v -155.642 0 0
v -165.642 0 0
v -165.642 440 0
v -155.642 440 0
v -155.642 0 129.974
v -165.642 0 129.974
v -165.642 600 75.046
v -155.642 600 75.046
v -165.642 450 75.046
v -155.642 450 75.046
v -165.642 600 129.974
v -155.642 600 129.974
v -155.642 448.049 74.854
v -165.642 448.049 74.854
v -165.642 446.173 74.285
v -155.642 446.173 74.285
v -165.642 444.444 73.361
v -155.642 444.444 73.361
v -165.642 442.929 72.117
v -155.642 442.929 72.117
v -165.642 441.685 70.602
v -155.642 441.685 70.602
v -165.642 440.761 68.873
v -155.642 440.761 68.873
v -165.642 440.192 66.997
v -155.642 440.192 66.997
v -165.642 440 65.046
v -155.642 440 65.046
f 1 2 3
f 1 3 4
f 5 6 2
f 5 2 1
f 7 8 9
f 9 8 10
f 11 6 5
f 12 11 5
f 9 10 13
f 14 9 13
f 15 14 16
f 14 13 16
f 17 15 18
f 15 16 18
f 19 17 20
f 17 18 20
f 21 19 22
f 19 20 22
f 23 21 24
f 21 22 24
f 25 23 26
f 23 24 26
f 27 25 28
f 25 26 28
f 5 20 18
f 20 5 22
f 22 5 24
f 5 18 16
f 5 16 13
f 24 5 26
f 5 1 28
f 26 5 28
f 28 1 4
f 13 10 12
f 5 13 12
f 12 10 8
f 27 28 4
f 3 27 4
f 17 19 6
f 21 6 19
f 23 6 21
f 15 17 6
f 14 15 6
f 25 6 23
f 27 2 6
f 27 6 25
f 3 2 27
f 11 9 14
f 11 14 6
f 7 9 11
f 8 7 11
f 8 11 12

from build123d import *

# Parameters (mm, degrees)
ESQUISSE1_W             = 10
ESQUISSE1_H             = 600
BOSS_EXTRU_1_DEPTH      = 129.973967
ENL_V_MAT_EXTRU_1_DEPTH = 10


with BuildPart() as part:
    # Esquisse1 → Boss.-Extru.1 (new body)
    with BuildSketch(Plane.XY):
        with Locations((-160.641983179, 300)):
            Rectangle(ESQUISSE1_W, ESQUISSE1_H)
    extrude(amount=BOSS_EXTRU_1_DEPTH)

    # Esquisse2 → Enlèv. mat.-Extru.1 (cut)
    with BuildSketch(Plane(origin=(-155.641983179, 0, 0), x_dir=(0, 0, -1), z_dir=(1, 0, 0))):
        with BuildLine():
            Line((0, 600), (-75.04598428, 600))
            Line((-75.04598428, 600), (-75.04598428, 450))
            ThreePointArc((-75.04598428, 450), (-72.117052092, 442.928932188), (-65.04598428, 440))
            Line((-65.04598428, 440), (0, 440))
            Line((0, 440), (0, 600))
        make_face()
    extrude(amount=-ENL_V_MAT_EXTRU_1_DEPTH, mode=Mode.SUBTRACT)


solid = part.part
